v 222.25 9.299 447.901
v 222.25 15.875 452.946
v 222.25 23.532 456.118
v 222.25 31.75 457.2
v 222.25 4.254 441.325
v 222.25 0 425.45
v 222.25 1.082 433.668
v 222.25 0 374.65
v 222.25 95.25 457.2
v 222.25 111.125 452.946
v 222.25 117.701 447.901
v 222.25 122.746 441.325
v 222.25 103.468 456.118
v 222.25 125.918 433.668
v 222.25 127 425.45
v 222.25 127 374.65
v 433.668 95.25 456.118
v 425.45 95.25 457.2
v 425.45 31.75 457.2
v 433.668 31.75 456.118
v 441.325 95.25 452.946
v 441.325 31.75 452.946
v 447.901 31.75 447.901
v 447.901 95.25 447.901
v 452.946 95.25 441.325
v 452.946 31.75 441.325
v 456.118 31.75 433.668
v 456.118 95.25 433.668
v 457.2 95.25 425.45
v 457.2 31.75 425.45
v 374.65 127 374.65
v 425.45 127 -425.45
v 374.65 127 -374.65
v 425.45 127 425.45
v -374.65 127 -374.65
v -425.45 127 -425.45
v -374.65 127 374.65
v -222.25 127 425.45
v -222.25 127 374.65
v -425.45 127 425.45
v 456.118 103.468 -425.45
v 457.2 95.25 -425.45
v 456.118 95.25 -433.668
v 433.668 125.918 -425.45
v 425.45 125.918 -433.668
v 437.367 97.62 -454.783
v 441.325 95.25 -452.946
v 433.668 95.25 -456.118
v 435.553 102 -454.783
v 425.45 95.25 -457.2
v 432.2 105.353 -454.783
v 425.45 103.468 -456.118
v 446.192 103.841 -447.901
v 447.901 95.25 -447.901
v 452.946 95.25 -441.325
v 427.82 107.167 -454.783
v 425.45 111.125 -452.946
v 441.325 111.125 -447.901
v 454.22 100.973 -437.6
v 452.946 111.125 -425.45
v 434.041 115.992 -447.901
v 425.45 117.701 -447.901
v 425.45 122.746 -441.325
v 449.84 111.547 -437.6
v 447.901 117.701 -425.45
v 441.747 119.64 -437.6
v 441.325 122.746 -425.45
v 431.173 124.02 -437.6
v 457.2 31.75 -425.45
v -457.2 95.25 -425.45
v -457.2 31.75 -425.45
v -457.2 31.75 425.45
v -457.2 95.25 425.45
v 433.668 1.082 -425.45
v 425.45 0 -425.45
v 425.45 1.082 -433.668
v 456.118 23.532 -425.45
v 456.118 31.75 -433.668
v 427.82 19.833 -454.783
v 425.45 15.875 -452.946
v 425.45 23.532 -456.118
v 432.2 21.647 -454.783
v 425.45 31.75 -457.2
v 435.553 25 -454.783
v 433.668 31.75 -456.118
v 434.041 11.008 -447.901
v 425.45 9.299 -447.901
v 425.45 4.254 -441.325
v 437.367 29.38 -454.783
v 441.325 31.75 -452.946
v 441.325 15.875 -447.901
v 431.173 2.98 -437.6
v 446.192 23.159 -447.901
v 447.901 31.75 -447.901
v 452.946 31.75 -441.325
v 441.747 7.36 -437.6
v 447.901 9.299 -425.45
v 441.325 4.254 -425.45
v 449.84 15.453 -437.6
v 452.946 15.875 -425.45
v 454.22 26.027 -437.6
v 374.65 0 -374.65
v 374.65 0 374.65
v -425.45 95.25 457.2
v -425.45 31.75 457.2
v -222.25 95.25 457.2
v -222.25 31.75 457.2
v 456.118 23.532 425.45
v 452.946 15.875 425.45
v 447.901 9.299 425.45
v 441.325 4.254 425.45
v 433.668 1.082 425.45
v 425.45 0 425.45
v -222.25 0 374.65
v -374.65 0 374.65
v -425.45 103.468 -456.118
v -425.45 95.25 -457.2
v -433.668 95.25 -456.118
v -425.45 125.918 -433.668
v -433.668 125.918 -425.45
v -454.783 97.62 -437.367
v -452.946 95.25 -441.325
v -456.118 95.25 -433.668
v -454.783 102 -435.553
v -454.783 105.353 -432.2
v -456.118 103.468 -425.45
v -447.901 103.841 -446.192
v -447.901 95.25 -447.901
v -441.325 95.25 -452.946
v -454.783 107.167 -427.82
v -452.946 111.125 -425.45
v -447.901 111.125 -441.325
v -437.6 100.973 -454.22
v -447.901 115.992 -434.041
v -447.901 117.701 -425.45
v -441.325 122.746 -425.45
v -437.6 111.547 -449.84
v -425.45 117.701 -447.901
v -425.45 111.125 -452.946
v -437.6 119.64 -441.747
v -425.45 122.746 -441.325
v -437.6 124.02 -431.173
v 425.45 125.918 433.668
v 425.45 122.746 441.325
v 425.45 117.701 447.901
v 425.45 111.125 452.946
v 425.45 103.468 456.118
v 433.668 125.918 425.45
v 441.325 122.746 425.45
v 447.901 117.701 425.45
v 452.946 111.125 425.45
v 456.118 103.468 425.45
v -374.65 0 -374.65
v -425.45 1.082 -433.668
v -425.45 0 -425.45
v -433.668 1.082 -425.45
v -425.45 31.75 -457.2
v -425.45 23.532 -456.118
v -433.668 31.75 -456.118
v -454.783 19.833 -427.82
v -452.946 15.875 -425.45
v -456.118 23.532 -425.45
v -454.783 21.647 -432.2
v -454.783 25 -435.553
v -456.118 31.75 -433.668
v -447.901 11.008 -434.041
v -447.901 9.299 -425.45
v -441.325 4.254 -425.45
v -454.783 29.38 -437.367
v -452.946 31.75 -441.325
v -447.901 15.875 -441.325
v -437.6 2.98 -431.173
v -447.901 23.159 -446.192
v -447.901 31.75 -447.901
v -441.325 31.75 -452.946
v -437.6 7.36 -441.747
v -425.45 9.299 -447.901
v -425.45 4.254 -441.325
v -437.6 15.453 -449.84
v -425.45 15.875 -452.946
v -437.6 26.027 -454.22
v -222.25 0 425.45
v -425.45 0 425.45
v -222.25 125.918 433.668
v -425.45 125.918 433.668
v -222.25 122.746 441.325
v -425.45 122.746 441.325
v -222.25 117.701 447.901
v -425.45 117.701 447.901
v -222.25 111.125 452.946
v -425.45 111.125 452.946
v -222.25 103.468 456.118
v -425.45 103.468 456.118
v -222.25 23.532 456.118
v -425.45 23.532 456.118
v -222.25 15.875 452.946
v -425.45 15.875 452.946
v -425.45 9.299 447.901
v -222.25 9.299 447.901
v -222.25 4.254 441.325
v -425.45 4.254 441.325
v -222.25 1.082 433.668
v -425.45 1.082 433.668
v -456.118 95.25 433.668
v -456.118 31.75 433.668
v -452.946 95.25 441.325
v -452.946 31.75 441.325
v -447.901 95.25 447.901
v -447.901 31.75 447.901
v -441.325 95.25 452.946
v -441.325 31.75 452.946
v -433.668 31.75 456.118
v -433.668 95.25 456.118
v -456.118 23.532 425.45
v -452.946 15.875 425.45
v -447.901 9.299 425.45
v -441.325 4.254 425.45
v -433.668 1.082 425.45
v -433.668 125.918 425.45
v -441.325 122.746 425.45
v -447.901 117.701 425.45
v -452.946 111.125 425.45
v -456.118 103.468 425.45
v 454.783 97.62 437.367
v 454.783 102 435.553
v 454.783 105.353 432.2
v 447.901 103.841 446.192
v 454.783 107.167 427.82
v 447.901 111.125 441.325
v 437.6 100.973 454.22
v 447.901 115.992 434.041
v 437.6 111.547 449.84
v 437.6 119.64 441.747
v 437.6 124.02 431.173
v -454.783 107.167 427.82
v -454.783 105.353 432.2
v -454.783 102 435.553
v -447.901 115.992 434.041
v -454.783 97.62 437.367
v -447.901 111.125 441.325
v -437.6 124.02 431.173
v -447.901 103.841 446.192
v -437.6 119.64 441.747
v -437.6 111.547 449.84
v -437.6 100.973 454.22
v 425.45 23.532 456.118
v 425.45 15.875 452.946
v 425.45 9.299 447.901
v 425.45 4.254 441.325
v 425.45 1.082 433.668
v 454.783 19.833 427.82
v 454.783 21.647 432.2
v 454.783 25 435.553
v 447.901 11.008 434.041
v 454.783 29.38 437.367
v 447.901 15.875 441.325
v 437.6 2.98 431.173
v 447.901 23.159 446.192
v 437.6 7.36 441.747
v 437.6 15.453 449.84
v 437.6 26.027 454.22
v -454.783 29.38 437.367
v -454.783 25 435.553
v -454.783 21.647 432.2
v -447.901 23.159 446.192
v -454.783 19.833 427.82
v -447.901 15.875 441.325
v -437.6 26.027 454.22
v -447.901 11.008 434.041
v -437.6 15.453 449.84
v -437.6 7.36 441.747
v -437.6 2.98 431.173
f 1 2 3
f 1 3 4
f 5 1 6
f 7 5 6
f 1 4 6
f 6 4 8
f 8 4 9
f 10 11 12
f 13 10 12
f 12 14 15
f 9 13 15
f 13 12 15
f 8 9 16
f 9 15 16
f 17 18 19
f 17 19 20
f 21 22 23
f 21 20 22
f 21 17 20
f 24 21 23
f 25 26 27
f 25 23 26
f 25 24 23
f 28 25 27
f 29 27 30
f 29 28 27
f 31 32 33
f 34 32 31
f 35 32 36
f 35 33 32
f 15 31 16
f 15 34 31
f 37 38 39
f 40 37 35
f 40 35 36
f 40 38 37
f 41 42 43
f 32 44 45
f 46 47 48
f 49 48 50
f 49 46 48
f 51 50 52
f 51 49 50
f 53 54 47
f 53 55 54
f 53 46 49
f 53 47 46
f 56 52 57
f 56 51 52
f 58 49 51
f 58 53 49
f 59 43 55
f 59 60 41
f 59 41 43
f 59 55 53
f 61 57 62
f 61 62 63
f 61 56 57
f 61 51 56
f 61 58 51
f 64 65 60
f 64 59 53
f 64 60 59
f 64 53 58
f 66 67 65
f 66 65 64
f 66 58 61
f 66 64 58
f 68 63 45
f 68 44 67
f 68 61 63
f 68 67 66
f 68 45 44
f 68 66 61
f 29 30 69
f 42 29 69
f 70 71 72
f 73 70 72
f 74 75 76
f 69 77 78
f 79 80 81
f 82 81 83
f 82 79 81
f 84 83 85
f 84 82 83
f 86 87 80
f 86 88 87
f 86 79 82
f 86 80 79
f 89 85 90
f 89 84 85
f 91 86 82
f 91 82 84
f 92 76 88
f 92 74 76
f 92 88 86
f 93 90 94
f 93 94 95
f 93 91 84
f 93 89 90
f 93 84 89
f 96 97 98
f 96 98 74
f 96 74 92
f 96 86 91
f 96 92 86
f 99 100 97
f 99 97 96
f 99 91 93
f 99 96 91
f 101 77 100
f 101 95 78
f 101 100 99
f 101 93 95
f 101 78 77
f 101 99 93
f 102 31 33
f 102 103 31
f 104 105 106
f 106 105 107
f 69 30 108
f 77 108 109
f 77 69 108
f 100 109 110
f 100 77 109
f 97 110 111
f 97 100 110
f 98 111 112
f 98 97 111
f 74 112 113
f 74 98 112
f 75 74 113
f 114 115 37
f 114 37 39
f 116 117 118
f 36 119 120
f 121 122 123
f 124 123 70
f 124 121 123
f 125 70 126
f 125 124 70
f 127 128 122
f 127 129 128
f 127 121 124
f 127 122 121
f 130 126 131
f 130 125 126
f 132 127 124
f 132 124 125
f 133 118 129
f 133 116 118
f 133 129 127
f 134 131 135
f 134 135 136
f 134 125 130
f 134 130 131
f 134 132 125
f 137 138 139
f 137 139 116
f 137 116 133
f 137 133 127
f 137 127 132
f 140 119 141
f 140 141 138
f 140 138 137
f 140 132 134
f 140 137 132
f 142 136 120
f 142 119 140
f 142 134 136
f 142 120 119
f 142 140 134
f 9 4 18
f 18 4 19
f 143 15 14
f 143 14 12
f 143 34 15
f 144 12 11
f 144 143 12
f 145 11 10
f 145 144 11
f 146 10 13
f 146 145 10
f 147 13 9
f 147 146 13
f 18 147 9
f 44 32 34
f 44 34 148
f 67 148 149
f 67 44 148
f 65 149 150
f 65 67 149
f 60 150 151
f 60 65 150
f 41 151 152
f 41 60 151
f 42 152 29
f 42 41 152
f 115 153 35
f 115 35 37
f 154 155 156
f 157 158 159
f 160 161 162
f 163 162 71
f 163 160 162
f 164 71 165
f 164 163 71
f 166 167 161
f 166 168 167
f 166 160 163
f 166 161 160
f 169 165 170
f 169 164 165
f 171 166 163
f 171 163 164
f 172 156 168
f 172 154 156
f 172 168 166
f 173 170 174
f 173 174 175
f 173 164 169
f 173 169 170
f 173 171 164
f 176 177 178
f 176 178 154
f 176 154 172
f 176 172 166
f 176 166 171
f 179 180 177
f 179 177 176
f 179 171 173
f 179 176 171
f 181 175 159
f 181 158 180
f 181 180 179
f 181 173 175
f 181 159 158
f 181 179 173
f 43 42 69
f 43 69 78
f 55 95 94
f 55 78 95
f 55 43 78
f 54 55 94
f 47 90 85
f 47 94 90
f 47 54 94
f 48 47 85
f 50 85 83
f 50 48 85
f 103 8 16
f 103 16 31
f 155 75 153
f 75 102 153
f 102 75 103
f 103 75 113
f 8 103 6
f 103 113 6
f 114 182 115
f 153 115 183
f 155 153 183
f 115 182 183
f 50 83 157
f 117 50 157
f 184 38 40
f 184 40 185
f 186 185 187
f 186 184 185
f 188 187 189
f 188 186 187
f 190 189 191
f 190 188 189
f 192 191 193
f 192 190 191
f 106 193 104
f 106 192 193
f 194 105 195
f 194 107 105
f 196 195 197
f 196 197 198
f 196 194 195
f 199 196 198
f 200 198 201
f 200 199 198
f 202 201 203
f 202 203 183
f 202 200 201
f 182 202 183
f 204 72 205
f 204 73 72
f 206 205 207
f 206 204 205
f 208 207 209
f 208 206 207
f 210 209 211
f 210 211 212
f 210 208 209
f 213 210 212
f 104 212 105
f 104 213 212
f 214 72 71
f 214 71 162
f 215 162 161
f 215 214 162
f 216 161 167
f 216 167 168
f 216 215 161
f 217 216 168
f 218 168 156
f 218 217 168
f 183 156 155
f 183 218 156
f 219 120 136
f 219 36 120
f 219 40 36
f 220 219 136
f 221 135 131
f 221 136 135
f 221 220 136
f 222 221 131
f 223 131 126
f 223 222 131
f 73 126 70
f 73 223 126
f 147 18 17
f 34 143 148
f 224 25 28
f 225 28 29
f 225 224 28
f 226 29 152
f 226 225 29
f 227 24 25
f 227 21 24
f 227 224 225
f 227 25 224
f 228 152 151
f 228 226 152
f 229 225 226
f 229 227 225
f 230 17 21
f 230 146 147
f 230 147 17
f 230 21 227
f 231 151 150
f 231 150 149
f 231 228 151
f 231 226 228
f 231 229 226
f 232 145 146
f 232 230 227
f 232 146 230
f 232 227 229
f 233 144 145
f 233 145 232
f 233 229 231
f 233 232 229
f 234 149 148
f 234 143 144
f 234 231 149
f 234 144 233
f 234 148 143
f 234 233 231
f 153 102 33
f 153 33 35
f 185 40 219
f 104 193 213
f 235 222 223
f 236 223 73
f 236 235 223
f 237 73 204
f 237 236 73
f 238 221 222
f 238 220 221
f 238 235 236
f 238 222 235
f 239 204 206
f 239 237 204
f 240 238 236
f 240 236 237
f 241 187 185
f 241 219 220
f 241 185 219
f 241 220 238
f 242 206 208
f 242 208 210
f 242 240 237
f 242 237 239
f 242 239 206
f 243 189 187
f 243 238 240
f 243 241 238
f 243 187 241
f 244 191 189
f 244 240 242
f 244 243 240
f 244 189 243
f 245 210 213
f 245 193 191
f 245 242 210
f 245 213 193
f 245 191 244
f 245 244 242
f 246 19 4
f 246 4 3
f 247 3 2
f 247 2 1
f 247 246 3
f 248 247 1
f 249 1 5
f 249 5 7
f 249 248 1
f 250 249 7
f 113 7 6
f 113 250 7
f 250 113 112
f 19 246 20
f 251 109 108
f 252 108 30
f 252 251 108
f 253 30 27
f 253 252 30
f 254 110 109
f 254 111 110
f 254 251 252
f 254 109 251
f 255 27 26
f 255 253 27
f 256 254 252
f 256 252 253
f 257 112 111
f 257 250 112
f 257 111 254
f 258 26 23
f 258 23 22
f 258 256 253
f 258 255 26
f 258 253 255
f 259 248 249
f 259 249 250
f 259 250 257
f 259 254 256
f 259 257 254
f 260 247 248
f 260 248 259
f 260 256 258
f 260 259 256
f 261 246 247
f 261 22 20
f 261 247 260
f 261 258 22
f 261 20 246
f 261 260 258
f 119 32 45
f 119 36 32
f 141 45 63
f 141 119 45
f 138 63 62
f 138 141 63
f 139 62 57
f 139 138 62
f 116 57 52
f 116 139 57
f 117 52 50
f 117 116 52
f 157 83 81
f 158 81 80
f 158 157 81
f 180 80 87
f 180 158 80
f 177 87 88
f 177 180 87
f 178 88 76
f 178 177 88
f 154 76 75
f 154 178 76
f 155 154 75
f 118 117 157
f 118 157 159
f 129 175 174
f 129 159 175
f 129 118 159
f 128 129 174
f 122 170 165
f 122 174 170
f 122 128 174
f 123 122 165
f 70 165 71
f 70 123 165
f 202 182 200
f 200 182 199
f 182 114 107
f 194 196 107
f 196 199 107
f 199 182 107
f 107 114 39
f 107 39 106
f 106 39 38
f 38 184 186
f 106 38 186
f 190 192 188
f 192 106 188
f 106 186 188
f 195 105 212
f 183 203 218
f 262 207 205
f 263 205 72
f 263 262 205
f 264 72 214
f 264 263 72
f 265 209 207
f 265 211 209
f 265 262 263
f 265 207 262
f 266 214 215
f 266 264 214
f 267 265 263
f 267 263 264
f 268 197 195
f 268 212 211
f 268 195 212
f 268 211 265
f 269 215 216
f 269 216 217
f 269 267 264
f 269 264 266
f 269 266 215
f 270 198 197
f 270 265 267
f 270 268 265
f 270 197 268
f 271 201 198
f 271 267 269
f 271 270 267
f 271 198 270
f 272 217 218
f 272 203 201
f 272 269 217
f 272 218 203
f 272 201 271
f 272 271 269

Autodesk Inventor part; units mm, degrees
ref_plane "YZ Plane" through (0, 0, 0) normal (1, 0, 0) x (0, 1, 0)
ref_plane "XZ Plane" through (0, 0, 0) normal (0, 1, 0) x (-1, 0, 0)
ref_plane "XY Plane" through (0, 0, 0) normal (0, 0, 1) x (1, 0, 0)
sketch "Sketch1" plane through (0, 0, 0) normal (0, 1, 0) x (-1, 0, 0)
  line L0 (374.65, 374.65) -> (-374.65, 374.65)
  line L1 (-374.65, 374.65) -> (-374.65, -374.65)
  line L2 (-374.65, -374.65) -> (374.65, -374.65)
  line L3 (374.65, -374.65) -> (374.65, 374.65)
  line L4 (374.65, 374.65) -> (-374.65, -374.65) construction
  line L5 (-374.65, 374.65) -> (374.65, -374.65) construction
  line L6 (457.2, 457.2) -> (-457.2, 457.2)
  line L7 (-457.2, 457.2) -> (-457.2, -457.2)
  line L8 (-457.2, -457.2) -> (457.2, -457.2)
  line L9 (457.2, -457.2) -> (457.2, 457.2)
  line L10 (457.2, 457.2) -> (-457.2, -457.2) construction
  line L11 (-457.2, 457.2) -> (457.2, -457.2) construction
  point P0 (0, 0)
  dimension "d0" = 82.55
  dimension "d1" = 82.55
  dimension "d2" = 749.3
  dimension "d3" = 749.3
extrude "Extrusion1" add sketch "Sketch1" along normal blind 127
fillet "Fillet1" radius 31.75 12 edges at (0, 127, 457.2) (0, 0, 457.2) (457.2, 63.5, 457.2) (457.2, 127, 0) (457.2, 0, 0) (457.2, 63.5, -457.2) (0, 127, -457.2) (-457.2, 127, 0) (-457.2, 63.5, 457.2) (0, 0, -457.2) (-457.2, 63.5, -457.2) (-457.2, 0, 0)
sketch "Bumper_Gaps" plane through (0, 127, 0) normal (0, 1, 0) x (1, 0, 0)
  line L0 (-222.25, -457.2) -> (222.25, -457.2)
  line L1 (222.25, -457.2) -> (222.25, -374.65)
  line L2 (222.25, -374.65) -> (-222.25, -374.65)
  line L3 (-222.25, -374.65) -> (-222.25, -457.2)
  line L4 (-222.25, -457.2) -> (222.25, -374.65) construction
  line L5 (222.25, -457.2) -> (-222.25, -374.65) construction
  line L6 (-457.2, -254) -> (-374.65, -254)
  line L7 (-374.65, -254) -> (-374.65, 254)
  line L8 (-374.65, 254) -> (-457.2, 254)
  line L9 (-457.2, 254) -> (-457.2, -254)
  line L10 (-457.2, -254) -> (-374.65, 254) construction
  line L11 (-374.65, -254) -> (-457.2, 254) construction
  line L12 (374.65, -254) -> (457.2, -254)
  line L13 (457.2, -254) -> (457.2, 254)
  line L14 (457.2, 254) -> (374.65, 254)
  line L15 (374.65, 254) -> (374.65, -254)
  line L16 (374.65, -254) -> (457.2, 254) construction
  line L17 (457.2, -254) -> (374.65, 254) construction
  line L18 (-374.65, -374.65) -> (-374.65, 374.65) projected
  line L19 (-457.2, 425.45) -> (-457.2, -425.45) projected
  line L20 (374.65, 374.65) -> (374.65, -374.65) projected
  line L21 (457.2, -425.45) -> (457.2, 425.45) projected
  line L22 (374.65, -374.65) -> (-374.65, -374.65) projected
  line L23 (-425.45, -457.2) -> (425.45, -457.2) projected
  line L24 (-196.85, 374.65) -> (196.85, 374.65)
  line L25 (196.85, 374.65) -> (196.85, 457.2)
  line L26 (196.85, 457.2) -> (-196.85, 457.2)
  line L27 (-196.85, 457.2) -> (-196.85, 374.65)
  line L28 (-196.85, 374.65) -> (196.85, 457.2) construction
  line L29 (196.85, 374.65) -> (-196.85, 457.2) construction
  line L30 (425.45, 457.2) -> (-425.45, 457.2) projected
  line L31 (-374.65, 374.65) -> (374.65, 374.65) projected
  point P0 (0, 0)
  point P1 (0, -415.925)
  point P2 (-415.925, 0)
  point P3 (415.925, 0)
  point P4 (0, 415.925)
  dimension "d15" = 444.5
  dimension "d16" = 393.7
  dimension "d17" = 508
  dimension "d18" = 508
extrude "Front_Gap" cut sketch "Bumper_Gaps" against normal through all contours L3 L2 L1 L0
extrude "Back_Gap" [suppressed]
extrude "Left_Gap" [suppressed]
extrude "Right_Gap" [suppressed]
equation "\"d1\" = d0"
equation "\"d2\" = Length"
equation "\"d3\" = Width"
equation "\"d15\" = Front_Width"
equation "\"d16\" = Back_Width"
equation "\"d17\" = Left_Width"
equation "\"d18\" = Right_Width"
equation "\"Length\" = 749.3"
equation "\"Width\" = 749.3"
equation "\"Front_Width\" = 444.5"
equation "\"Back_Width\" = 393.7"
equation "\"Left_Width\" = 508"
equation "\"Right_Width\" = 508"
equation "\"Front_Edge\" = 152.4"
equation "\"Back_Edge\" = 152.4"
equation "\"Left_Edge\" = 152.4"
equation "\"Right_Edge\" = 152.4"
equation "\"FECalc\" = -0.5 * Front_Width + 0.5 * Width"
equation "\"BECalc\" = -0.5 * Back_Width + 0.5 * Width"
equation "\"LECalc\" = -0.5 * Left_Width + 0.5 * Length"
equation "\"RECalc\" = -0.5 * Right_Width + 0.5 * Length"
equation "\"FWCalc\" = Width - 2 * Front_Edge"
equation "\"BWCalc\" = Width - 2 * Back_Edge"
equation "\"LWCalc\" = Length - 2 * Left_Edge"
equation "\"RWCalc\" = Length - 2 * Right_Edge"
properties part number "Bumper Template (WIP)"
